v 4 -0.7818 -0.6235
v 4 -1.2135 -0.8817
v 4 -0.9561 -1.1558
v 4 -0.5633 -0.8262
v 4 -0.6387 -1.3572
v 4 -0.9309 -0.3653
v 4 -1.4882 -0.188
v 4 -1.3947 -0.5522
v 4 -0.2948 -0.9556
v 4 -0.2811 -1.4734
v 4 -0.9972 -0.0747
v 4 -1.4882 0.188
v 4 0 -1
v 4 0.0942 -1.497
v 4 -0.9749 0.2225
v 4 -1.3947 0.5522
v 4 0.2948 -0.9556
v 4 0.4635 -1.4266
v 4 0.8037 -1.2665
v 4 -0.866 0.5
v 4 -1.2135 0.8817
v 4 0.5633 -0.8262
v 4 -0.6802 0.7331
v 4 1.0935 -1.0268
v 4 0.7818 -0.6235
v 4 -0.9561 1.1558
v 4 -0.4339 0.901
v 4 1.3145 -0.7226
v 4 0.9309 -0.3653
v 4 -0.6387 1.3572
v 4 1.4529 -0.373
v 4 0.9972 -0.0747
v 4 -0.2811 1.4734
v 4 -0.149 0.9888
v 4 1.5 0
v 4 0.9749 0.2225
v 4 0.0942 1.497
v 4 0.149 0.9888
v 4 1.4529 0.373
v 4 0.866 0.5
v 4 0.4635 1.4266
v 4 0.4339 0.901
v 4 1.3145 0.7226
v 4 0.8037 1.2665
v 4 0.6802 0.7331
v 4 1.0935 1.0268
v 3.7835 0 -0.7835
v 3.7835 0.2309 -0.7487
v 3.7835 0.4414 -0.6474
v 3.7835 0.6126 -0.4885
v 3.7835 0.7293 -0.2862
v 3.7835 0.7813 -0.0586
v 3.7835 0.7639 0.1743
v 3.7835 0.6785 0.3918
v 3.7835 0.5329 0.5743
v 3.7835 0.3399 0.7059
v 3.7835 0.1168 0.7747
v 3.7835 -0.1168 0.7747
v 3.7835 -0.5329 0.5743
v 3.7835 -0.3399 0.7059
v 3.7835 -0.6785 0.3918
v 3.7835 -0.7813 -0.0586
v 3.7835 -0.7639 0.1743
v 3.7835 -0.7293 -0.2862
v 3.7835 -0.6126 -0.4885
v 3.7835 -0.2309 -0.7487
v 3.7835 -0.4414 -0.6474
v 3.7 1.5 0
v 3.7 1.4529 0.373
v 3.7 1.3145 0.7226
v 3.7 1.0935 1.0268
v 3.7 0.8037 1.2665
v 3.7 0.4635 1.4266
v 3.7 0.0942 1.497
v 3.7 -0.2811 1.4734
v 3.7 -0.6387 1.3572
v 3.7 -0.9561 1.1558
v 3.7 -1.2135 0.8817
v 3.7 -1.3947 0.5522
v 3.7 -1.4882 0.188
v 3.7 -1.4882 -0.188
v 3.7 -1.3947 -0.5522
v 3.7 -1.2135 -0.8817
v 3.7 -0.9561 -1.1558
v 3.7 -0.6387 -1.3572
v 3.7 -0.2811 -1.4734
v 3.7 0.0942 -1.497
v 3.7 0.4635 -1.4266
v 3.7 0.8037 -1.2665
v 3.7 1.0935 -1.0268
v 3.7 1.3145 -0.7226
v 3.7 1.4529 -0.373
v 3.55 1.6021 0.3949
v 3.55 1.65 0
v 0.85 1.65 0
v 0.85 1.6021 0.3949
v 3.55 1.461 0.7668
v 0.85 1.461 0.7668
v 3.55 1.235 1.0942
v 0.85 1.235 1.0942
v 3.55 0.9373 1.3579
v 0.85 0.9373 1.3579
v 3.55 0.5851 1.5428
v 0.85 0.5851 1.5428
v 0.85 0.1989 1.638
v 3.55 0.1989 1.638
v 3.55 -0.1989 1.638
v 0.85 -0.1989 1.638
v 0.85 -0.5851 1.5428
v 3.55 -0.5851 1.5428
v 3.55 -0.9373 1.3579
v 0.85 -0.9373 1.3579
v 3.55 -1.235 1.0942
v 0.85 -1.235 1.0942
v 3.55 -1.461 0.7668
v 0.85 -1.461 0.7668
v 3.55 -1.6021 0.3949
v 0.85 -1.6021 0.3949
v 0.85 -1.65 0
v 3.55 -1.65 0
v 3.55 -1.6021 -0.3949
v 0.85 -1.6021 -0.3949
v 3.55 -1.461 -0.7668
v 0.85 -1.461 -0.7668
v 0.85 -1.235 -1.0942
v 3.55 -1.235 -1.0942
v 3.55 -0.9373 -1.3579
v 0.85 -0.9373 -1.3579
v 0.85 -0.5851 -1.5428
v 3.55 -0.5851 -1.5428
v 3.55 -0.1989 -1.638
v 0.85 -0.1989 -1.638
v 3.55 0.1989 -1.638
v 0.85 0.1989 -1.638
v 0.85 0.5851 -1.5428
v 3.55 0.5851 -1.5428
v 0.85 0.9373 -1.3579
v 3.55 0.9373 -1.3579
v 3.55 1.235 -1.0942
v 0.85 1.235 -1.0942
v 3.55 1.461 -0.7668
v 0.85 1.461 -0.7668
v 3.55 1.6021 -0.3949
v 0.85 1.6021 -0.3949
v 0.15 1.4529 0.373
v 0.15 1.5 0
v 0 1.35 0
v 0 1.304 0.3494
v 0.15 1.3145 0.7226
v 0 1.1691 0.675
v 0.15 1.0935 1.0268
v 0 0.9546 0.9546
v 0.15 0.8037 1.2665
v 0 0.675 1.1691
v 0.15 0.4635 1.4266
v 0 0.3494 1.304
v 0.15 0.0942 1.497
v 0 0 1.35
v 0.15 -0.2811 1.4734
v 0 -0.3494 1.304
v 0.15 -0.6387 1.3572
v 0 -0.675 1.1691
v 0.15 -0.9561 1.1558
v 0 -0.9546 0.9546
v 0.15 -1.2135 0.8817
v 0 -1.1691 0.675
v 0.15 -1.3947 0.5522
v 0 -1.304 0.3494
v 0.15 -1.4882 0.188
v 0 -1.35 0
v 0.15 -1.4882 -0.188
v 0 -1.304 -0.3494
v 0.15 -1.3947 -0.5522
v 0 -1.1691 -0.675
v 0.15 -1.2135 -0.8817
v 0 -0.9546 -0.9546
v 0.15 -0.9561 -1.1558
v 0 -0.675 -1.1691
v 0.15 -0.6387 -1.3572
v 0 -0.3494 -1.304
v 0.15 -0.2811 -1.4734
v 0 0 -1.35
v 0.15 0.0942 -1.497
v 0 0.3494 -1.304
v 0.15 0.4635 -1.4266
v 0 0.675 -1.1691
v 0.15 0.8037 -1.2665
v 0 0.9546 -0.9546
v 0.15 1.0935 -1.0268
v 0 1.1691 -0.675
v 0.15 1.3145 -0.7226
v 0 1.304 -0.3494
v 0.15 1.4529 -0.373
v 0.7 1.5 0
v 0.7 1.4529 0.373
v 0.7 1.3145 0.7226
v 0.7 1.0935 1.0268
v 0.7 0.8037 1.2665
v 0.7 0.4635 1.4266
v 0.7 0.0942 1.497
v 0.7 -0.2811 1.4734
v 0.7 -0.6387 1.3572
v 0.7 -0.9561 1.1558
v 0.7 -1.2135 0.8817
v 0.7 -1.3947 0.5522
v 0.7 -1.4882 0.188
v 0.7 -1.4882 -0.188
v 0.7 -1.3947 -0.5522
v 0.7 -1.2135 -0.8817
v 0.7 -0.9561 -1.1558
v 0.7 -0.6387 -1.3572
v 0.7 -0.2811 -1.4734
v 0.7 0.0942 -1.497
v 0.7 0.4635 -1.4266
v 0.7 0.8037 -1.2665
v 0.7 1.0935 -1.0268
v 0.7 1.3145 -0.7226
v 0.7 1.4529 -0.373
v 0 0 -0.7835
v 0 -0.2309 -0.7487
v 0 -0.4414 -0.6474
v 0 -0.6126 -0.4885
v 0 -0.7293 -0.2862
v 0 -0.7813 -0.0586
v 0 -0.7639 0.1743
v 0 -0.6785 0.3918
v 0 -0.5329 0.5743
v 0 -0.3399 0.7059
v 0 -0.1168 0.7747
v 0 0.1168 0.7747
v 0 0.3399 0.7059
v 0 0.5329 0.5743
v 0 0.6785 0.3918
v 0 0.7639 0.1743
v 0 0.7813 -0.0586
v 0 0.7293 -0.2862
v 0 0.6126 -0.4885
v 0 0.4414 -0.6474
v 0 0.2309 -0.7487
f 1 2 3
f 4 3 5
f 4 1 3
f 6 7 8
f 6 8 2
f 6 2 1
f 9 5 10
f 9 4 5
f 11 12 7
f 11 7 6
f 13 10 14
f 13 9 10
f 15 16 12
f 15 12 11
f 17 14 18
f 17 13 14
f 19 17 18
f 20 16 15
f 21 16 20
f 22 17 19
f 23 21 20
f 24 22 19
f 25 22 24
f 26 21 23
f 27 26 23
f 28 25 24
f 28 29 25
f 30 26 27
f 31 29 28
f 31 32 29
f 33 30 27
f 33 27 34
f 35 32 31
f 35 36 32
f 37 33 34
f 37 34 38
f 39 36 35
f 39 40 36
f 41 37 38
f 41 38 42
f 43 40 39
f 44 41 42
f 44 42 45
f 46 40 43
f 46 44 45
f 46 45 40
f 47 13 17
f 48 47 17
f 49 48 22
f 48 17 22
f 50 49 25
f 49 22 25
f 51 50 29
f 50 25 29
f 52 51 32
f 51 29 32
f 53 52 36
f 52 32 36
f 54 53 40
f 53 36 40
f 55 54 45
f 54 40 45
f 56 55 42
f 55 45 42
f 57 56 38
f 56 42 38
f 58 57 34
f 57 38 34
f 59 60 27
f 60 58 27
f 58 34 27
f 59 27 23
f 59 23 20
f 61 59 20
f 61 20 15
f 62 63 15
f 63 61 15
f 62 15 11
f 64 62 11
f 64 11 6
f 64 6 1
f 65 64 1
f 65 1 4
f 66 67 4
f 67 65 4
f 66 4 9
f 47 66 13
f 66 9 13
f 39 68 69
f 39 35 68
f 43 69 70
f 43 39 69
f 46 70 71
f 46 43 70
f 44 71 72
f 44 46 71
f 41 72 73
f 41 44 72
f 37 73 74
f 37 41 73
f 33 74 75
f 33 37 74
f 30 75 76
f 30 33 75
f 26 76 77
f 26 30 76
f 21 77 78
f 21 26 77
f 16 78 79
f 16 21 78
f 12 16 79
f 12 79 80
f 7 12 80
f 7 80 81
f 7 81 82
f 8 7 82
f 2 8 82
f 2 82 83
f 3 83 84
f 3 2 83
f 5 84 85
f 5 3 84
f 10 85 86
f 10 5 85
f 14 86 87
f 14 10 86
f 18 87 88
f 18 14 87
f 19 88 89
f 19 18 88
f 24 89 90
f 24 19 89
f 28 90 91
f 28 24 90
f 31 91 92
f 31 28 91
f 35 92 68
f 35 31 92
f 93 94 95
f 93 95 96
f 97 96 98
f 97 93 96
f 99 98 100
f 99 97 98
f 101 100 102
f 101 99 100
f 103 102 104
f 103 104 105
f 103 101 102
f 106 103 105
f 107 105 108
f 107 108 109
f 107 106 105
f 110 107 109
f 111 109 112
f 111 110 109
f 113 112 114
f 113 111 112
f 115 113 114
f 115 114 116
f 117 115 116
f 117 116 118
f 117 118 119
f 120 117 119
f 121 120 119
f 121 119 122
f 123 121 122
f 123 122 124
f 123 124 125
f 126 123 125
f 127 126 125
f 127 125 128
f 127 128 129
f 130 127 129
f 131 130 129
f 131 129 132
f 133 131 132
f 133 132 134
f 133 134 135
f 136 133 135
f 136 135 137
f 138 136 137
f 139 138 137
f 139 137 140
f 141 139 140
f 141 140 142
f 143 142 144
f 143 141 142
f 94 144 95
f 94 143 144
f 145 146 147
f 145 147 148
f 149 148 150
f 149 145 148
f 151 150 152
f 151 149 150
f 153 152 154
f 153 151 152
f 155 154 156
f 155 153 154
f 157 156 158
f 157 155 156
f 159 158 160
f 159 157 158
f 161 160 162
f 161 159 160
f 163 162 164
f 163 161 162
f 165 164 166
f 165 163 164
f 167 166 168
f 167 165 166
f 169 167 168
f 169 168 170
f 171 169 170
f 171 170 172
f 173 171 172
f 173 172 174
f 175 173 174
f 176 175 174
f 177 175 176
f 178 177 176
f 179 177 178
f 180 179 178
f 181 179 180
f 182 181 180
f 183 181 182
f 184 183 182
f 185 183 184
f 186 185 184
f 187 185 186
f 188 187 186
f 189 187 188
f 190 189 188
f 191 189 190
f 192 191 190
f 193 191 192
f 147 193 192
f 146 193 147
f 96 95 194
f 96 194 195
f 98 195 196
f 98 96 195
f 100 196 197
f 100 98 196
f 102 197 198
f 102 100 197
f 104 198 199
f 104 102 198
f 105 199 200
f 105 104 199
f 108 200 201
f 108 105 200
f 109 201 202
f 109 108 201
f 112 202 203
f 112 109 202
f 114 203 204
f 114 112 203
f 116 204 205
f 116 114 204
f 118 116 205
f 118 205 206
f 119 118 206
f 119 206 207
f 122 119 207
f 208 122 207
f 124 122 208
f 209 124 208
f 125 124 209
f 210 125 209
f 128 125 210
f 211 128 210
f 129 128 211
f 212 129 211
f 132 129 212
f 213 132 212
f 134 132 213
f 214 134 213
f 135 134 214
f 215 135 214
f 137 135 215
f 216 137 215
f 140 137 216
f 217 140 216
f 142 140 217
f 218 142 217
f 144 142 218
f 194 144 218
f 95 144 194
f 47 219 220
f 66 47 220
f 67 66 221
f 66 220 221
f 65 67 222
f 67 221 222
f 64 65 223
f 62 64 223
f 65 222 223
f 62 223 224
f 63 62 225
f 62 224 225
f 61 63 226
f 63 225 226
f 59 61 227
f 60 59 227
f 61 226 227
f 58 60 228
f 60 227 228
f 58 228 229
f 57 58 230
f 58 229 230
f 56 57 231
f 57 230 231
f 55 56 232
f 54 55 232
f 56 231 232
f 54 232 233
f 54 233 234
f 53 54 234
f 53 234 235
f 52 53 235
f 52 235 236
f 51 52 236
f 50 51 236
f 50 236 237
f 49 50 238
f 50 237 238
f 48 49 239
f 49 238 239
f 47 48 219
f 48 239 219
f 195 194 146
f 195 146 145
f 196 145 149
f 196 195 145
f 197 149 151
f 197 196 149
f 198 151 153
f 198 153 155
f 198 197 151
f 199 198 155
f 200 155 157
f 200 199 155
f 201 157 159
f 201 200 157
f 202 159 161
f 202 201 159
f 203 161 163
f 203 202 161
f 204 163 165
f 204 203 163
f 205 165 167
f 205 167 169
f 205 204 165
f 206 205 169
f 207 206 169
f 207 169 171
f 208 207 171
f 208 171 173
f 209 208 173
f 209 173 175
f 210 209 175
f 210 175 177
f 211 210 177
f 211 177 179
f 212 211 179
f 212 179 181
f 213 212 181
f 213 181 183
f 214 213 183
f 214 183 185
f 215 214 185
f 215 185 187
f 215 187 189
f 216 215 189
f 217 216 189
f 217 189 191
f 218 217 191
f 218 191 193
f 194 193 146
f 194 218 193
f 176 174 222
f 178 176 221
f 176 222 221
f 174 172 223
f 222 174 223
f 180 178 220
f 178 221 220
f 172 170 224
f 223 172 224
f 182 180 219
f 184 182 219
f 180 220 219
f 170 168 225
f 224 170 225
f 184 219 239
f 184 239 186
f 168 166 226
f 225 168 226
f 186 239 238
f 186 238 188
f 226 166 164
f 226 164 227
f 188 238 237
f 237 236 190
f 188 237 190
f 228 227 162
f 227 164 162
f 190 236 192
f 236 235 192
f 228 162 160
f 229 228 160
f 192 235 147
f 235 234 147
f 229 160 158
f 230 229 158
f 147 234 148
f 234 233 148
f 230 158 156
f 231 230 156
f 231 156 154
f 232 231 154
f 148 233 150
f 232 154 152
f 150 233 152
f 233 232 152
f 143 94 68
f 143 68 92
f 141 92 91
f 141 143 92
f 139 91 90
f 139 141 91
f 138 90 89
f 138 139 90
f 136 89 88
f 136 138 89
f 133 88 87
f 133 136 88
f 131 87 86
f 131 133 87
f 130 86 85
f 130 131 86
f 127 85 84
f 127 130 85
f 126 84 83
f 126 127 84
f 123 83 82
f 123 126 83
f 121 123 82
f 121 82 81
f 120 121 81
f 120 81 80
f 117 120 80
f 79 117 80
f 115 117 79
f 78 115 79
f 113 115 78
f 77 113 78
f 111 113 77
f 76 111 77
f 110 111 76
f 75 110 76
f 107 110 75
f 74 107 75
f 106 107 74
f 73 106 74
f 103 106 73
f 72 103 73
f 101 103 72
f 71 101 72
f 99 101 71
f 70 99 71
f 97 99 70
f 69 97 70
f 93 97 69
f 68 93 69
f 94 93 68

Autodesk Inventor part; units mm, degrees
ref_plane "YZ Plane" through (0, 0, 0) normal (1, 0, 0) x (0, 1, 0)
ref_plane "XZ Plane" through (0, 0, 0) normal (0, 1, 0) x (-1, 0, 0)
ref_plane "XY Plane" through (0, 0, 0) normal (0, 0, 1) x (1, 0, 0)
sketch "_____2" plane through (0, 0, 0) normal (0, 0, 1) x (1, 0, 0)
  line L0 (4, 0) -> (0, 0)
  line L1 (0, 0) -> (0, 1.35)
  line L2 (0, 1.35) -> (0.15, 1.5)
  line L3 (0.15, 1.5) -> (0.7, 1.5)
  line L4 (0.7, 1.5) -> (0.85, 1.65)
  line L5 (0.85, 1.65) -> (3.55, 1.65)
  line L6 (3.55, 1.65) -> (3.7, 1.5)
  line L7 (3.7, 1.5) -> (4, 1.5)
  line L8 (4, 1.5) -> (4, 0)
  line L9 (4, 0) -> (0, 0)
revolve "Revolution1" add sketch "_____2" angle 360 about axis through (4, 0, 0) along (1, 0, 0)
sketch "Sketch2" plane through (4, 0, 0) normal (1, 0, 0) x (0, 0, -1)
  point P0 (0, 0)
hole "Hole1" at (4, 0, 0) direction (-1, 0, 0) diameter 1.567 depth 4 countersink diameter 2 countersink angle 90 thread size "M2x0.4" class "6H" standard "ISO Metric profile"
properties part number "MBIS2-3-4"
